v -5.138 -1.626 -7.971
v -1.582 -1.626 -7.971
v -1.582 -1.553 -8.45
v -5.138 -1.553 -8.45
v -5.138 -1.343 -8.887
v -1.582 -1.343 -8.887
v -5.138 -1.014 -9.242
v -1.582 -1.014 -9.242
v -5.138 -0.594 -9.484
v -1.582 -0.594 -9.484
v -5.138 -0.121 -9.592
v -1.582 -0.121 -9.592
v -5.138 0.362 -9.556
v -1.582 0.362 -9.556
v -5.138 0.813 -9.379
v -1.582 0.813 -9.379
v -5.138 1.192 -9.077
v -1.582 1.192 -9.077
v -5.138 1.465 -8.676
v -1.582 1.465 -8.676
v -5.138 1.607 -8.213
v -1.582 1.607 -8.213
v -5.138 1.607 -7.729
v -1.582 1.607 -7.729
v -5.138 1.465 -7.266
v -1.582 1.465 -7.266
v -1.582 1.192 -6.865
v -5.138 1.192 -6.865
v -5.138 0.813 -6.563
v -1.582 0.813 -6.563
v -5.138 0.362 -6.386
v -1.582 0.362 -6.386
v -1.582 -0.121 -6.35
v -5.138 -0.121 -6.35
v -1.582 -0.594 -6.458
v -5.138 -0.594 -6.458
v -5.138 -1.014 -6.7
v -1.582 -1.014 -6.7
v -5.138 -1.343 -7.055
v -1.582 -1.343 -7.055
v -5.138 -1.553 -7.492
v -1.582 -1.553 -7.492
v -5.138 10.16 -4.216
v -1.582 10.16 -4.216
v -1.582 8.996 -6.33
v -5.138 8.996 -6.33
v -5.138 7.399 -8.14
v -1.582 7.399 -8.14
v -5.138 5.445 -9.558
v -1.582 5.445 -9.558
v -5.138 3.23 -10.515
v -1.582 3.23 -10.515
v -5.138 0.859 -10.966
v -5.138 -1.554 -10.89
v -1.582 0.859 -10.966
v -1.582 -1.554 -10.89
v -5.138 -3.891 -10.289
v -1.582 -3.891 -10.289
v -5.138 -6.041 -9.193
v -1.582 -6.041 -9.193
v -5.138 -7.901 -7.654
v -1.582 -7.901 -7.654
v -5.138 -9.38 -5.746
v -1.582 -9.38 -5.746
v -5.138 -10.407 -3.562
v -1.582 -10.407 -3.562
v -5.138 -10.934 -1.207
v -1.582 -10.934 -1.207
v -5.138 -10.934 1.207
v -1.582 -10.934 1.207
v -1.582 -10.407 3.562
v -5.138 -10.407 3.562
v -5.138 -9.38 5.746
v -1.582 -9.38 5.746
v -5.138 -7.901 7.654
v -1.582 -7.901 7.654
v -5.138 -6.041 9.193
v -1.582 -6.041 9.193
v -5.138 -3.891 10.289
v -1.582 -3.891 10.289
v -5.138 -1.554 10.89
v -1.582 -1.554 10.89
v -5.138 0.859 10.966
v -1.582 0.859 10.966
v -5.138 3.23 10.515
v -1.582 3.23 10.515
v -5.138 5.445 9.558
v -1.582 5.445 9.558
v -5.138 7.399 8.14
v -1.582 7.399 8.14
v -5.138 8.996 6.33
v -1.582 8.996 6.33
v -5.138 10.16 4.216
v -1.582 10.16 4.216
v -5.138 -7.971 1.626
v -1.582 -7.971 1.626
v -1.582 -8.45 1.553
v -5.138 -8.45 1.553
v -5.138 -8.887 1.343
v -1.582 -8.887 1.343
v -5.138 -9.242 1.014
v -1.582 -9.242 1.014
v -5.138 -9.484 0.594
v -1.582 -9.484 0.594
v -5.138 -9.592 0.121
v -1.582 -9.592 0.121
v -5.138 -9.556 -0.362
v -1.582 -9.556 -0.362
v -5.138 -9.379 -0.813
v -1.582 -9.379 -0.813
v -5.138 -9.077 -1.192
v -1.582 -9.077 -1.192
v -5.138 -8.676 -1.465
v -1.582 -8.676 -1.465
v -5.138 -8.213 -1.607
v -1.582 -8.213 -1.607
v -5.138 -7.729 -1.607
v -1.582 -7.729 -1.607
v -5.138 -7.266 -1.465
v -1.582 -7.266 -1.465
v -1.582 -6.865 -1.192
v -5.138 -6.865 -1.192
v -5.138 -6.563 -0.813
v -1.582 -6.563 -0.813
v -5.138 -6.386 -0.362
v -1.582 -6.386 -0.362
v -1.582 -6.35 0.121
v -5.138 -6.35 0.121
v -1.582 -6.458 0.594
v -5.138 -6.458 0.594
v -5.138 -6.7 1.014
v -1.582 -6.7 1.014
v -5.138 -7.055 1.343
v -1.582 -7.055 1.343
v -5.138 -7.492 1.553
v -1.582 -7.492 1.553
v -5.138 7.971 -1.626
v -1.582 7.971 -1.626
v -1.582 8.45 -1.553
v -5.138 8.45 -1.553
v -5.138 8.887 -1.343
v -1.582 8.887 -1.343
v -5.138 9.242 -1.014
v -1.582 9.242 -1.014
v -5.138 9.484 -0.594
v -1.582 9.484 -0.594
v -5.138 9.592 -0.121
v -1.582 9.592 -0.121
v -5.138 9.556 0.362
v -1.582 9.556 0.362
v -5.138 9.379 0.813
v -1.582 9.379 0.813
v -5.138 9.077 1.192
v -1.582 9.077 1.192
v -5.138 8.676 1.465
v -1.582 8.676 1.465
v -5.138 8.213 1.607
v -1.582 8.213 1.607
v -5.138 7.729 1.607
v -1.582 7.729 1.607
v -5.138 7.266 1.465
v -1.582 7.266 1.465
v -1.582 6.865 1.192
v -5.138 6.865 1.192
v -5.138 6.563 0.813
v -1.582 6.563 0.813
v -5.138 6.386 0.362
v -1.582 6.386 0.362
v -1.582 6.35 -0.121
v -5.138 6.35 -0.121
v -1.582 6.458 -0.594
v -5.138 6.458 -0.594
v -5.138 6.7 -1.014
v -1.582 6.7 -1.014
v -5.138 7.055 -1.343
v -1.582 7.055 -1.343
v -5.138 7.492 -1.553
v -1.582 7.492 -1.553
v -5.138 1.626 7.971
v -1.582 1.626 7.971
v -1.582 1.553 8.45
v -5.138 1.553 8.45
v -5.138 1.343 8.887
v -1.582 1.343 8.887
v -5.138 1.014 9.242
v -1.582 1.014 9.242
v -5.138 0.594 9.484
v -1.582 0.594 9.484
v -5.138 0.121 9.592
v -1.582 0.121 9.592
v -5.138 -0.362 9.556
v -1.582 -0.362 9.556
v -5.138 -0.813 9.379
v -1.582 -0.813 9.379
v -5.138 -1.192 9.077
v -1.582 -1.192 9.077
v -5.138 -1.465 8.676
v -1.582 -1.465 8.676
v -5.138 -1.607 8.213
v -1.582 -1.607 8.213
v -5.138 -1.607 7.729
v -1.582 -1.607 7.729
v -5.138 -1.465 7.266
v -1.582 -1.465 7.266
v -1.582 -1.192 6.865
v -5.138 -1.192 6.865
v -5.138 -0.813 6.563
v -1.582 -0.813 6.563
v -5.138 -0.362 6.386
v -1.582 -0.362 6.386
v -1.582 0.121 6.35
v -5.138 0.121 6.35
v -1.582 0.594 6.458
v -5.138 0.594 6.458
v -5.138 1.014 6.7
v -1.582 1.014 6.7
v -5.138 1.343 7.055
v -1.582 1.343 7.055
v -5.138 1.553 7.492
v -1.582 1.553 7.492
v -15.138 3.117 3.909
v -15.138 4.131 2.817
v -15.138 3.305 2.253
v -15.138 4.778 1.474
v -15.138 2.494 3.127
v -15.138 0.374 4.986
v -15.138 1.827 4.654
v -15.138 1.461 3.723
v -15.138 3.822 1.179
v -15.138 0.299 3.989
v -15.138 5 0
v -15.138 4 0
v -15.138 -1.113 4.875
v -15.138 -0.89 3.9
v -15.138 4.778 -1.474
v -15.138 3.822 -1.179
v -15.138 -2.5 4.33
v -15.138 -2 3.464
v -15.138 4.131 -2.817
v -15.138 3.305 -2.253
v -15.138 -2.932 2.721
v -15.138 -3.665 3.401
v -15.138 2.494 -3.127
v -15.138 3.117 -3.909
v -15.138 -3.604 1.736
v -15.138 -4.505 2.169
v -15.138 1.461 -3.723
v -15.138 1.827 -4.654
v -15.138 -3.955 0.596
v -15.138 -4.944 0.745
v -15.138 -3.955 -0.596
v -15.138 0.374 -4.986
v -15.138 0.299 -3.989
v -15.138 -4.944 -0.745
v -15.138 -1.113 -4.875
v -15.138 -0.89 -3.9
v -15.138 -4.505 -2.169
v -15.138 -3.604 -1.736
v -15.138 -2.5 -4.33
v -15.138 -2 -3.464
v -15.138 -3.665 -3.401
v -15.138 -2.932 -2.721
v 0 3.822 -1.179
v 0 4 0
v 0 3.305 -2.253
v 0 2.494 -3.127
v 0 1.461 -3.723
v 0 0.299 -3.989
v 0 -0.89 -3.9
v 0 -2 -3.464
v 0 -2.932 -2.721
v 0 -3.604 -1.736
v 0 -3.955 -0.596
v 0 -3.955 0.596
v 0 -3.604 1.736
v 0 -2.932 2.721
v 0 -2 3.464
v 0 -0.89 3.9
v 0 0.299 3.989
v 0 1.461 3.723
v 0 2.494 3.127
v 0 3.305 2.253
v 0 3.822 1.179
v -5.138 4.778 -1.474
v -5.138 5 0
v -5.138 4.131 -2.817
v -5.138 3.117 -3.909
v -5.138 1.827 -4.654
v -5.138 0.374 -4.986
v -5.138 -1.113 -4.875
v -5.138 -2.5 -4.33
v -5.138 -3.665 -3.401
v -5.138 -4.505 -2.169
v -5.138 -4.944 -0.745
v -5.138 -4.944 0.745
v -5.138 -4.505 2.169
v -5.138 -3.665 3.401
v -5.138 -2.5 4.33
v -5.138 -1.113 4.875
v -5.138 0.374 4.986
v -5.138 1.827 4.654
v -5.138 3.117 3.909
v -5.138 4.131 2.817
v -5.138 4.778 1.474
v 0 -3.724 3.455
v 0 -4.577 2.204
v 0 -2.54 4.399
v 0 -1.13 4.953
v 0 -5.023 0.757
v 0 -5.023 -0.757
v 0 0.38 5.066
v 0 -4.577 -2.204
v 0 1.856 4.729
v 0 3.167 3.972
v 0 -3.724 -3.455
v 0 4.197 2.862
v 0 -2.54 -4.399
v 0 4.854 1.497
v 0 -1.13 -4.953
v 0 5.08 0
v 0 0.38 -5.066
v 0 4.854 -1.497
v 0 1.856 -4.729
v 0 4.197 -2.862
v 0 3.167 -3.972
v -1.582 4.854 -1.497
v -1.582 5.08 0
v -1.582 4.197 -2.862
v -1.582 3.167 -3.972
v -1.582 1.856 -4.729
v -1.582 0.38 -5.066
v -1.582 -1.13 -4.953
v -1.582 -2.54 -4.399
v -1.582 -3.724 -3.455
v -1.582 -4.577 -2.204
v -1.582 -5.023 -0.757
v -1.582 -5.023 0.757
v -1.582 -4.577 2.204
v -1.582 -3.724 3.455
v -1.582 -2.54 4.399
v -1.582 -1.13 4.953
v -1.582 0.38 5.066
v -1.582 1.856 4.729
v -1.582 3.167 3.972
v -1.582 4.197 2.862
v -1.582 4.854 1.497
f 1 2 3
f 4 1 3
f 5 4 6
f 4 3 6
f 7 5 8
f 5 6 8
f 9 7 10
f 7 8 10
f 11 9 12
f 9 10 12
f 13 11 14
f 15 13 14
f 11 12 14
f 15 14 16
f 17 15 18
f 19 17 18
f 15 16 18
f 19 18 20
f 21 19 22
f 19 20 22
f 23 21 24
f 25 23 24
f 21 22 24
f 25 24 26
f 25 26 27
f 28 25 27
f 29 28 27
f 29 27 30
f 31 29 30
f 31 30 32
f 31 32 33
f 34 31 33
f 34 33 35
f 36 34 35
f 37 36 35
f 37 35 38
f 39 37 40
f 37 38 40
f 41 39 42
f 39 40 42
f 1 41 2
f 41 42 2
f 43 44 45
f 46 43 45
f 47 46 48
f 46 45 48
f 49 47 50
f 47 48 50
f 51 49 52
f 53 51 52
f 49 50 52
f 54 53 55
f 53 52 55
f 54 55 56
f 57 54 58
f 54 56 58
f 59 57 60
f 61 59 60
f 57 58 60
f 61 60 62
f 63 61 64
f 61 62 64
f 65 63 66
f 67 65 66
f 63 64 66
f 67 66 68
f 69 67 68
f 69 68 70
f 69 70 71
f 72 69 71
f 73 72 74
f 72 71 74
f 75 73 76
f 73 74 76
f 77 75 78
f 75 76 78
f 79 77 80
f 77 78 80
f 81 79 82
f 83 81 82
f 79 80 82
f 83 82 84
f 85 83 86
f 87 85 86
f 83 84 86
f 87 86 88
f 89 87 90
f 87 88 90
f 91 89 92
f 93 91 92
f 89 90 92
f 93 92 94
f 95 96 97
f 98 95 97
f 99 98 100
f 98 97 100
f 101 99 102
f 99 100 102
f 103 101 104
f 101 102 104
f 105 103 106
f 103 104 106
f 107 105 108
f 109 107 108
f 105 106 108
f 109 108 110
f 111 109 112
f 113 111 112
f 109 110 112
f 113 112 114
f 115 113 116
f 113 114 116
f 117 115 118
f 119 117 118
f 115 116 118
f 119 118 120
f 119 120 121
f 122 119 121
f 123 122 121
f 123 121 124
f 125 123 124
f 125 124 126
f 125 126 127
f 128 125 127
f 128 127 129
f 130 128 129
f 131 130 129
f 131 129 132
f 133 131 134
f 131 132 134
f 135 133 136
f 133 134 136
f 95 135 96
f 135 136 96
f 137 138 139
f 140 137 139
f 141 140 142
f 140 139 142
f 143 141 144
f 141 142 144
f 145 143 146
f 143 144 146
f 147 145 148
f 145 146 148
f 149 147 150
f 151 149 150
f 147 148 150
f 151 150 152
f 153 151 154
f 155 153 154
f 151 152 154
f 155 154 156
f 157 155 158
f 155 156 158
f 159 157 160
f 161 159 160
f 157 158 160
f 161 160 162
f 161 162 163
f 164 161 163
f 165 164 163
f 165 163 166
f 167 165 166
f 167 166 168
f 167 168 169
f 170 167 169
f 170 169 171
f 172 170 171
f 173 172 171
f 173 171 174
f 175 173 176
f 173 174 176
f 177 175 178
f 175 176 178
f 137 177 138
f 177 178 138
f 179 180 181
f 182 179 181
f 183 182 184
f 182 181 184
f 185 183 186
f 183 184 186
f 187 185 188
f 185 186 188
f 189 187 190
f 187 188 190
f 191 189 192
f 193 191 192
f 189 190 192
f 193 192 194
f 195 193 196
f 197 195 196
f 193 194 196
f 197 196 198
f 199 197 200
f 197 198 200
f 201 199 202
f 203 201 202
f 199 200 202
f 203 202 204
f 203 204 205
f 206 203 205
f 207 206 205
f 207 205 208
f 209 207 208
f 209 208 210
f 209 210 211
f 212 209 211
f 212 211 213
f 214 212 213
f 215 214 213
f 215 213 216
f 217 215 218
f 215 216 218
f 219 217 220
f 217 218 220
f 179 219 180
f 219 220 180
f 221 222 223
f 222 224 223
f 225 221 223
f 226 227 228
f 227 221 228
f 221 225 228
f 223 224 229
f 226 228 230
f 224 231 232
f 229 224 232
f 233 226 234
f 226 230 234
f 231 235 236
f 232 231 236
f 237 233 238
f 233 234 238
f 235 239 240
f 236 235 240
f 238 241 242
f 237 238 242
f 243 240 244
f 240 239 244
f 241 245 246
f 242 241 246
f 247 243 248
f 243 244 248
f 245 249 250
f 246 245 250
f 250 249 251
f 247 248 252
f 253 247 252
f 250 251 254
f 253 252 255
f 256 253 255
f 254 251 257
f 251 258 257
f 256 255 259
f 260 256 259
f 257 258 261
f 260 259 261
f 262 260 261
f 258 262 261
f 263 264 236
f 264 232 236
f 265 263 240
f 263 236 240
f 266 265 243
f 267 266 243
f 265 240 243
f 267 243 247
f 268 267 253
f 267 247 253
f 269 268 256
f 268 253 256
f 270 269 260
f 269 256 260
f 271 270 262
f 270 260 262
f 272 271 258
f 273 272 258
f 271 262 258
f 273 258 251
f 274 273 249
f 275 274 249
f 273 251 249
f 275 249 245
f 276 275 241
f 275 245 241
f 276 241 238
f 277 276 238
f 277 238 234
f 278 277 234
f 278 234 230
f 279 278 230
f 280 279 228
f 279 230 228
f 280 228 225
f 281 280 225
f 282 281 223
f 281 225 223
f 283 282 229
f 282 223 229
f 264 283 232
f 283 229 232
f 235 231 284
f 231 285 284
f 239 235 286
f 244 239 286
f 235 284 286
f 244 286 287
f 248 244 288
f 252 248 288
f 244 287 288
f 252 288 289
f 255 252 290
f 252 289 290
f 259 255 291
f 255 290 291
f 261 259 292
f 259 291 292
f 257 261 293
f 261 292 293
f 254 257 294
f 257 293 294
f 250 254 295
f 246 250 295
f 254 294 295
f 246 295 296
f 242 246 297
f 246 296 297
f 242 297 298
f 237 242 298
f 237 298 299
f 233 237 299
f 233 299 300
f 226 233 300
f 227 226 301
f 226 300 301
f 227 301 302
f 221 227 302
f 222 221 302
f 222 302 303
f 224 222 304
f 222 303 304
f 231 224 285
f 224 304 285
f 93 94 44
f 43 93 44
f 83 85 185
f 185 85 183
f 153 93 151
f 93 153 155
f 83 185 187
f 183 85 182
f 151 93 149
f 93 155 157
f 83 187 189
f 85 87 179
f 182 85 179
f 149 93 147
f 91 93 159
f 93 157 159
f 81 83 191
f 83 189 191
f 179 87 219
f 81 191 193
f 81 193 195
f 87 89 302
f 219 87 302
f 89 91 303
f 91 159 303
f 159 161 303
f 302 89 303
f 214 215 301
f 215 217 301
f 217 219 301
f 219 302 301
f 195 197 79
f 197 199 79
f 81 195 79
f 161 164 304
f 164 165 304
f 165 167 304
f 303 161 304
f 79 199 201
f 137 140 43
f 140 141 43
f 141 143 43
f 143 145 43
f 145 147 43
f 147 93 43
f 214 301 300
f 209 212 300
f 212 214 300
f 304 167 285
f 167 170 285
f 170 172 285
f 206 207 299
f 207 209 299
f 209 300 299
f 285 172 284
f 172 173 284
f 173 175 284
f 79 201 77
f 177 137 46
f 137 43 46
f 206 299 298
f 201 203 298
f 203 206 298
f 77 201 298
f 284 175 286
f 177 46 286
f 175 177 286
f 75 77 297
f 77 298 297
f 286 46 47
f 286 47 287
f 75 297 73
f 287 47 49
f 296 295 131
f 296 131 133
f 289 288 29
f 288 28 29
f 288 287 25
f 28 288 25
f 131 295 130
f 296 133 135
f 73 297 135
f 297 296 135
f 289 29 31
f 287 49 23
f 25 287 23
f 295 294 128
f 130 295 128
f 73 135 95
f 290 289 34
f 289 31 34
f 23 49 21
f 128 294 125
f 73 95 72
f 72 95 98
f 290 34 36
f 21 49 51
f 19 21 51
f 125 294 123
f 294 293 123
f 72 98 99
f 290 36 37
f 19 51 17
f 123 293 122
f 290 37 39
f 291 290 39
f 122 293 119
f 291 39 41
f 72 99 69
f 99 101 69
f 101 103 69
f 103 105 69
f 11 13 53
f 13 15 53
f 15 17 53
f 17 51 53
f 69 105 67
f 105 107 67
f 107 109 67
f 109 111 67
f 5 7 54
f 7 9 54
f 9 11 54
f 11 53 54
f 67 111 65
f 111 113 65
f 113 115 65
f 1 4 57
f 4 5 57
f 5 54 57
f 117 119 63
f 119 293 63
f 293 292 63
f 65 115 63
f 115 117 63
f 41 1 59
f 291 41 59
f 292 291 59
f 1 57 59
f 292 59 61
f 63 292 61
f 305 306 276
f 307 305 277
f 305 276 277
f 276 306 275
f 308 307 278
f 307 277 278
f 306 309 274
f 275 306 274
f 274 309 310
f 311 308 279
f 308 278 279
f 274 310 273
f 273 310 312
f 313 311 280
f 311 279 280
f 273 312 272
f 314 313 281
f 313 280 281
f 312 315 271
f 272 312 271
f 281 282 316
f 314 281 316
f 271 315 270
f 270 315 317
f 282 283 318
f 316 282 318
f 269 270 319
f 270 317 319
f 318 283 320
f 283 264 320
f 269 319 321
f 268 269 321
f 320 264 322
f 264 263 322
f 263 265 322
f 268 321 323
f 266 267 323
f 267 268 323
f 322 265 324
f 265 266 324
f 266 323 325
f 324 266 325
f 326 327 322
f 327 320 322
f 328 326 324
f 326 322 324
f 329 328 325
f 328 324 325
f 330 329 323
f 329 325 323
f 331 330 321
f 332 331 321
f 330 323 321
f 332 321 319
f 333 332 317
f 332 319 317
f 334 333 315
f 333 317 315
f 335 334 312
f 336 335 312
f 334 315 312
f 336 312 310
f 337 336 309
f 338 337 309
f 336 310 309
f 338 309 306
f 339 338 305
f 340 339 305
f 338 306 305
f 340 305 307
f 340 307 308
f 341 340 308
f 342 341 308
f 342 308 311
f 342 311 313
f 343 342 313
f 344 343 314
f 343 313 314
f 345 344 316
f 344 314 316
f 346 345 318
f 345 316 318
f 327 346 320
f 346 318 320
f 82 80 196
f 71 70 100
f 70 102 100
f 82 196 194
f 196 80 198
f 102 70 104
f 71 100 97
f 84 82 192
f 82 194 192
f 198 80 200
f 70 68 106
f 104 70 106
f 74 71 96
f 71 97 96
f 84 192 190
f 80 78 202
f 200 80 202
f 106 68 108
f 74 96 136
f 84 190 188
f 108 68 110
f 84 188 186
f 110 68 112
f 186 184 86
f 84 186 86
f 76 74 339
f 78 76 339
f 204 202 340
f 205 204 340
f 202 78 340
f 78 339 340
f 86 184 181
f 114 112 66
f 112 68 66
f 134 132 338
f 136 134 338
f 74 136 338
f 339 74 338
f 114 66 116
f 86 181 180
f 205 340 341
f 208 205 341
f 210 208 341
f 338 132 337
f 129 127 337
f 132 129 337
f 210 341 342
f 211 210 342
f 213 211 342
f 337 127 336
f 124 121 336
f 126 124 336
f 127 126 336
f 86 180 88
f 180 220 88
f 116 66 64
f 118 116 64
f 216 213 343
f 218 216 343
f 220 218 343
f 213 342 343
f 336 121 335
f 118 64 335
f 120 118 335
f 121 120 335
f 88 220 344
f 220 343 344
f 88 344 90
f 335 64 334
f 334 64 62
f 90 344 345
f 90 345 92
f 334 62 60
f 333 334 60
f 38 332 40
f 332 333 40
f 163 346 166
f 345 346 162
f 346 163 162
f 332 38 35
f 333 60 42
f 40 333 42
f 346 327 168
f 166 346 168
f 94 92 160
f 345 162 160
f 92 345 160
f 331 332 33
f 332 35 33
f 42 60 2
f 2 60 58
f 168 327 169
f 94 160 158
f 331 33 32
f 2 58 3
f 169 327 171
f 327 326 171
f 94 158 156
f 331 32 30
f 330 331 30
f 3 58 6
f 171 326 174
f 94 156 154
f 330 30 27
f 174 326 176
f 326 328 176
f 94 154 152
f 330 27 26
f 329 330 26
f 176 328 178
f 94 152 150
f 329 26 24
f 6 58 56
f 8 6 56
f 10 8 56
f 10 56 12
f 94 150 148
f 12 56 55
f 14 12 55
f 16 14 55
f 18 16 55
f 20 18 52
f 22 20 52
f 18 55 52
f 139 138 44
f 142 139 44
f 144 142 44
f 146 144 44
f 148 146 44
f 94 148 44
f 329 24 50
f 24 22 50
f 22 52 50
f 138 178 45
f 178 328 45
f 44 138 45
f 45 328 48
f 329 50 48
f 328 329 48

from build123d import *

# Parameters (mm, degrees)
SKETCH2_R          = 1.6256
CUT_EXTRUDE1_DEPTH = 3.556
CIRPATTERN1_COUNT  = 4
CUT_EXTRUDE2_DEPTH = 3.556


with BuildPart() as part:
    # Sketch1 → Revolve1 (revolve)
    with BuildSketch(Plane.XY):
        Polygon((-15.1384, 4.99999), (-5.1384, 4.99999), (-5.1384, 11), (-1.5824, 11), (-1.5824, 5.08), (0, 5.08), (0, 4), (-15.1384, 4), align=None)
    revolve(axis=Axis((0, 0, 0), (-1, 0, 0)))

    # Sketch2 → Cut-Extrude1 (cut)
    with BuildSketch(Plane(origin=(-1.5824, 0, 0), x_dir=(0, 0, -1), z_dir=(1, 0, 0))):
        with Locations((0, 7.97105)):
            Circle(SKETCH2_R)
    cut_extrude1 = extrude(amount=-CUT_EXTRUDE1_DEPTH, mode=Mode.SUBTRACT)

    # CirPattern1: Cut-Extrude1 ×4 about axis
    cirpattern1_axis = Axis((0, 0, 0), (1, 0, 0))
    for i in range(1, CIRPATTERN1_COUNT):
        add(cut_extrude1.rotate(cirpattern1_axis, i * 360 / CIRPATTERN1_COUNT), mode=Mode.SUBTRACT)

    # Sketch3 → Cut-Extrude2 (cut)
    with BuildSketch(Plane(origin=(-1.5824, 0, 0), x_dir=(0, 0, -1), z_dir=(1, 0, 0))):
        with BuildLine():
            Line((-4.215969639, 10.16), (4.215969639, 10.16))
            ThreePointArc((4.215969639, 10.16), (0, 11), (-4.215969639, 10.16))
        make_face()
    extrude(amount=-CUT_EXTRUDE2_DEPTH, mode=Mode.SUBTRACT)


solid = part.part
